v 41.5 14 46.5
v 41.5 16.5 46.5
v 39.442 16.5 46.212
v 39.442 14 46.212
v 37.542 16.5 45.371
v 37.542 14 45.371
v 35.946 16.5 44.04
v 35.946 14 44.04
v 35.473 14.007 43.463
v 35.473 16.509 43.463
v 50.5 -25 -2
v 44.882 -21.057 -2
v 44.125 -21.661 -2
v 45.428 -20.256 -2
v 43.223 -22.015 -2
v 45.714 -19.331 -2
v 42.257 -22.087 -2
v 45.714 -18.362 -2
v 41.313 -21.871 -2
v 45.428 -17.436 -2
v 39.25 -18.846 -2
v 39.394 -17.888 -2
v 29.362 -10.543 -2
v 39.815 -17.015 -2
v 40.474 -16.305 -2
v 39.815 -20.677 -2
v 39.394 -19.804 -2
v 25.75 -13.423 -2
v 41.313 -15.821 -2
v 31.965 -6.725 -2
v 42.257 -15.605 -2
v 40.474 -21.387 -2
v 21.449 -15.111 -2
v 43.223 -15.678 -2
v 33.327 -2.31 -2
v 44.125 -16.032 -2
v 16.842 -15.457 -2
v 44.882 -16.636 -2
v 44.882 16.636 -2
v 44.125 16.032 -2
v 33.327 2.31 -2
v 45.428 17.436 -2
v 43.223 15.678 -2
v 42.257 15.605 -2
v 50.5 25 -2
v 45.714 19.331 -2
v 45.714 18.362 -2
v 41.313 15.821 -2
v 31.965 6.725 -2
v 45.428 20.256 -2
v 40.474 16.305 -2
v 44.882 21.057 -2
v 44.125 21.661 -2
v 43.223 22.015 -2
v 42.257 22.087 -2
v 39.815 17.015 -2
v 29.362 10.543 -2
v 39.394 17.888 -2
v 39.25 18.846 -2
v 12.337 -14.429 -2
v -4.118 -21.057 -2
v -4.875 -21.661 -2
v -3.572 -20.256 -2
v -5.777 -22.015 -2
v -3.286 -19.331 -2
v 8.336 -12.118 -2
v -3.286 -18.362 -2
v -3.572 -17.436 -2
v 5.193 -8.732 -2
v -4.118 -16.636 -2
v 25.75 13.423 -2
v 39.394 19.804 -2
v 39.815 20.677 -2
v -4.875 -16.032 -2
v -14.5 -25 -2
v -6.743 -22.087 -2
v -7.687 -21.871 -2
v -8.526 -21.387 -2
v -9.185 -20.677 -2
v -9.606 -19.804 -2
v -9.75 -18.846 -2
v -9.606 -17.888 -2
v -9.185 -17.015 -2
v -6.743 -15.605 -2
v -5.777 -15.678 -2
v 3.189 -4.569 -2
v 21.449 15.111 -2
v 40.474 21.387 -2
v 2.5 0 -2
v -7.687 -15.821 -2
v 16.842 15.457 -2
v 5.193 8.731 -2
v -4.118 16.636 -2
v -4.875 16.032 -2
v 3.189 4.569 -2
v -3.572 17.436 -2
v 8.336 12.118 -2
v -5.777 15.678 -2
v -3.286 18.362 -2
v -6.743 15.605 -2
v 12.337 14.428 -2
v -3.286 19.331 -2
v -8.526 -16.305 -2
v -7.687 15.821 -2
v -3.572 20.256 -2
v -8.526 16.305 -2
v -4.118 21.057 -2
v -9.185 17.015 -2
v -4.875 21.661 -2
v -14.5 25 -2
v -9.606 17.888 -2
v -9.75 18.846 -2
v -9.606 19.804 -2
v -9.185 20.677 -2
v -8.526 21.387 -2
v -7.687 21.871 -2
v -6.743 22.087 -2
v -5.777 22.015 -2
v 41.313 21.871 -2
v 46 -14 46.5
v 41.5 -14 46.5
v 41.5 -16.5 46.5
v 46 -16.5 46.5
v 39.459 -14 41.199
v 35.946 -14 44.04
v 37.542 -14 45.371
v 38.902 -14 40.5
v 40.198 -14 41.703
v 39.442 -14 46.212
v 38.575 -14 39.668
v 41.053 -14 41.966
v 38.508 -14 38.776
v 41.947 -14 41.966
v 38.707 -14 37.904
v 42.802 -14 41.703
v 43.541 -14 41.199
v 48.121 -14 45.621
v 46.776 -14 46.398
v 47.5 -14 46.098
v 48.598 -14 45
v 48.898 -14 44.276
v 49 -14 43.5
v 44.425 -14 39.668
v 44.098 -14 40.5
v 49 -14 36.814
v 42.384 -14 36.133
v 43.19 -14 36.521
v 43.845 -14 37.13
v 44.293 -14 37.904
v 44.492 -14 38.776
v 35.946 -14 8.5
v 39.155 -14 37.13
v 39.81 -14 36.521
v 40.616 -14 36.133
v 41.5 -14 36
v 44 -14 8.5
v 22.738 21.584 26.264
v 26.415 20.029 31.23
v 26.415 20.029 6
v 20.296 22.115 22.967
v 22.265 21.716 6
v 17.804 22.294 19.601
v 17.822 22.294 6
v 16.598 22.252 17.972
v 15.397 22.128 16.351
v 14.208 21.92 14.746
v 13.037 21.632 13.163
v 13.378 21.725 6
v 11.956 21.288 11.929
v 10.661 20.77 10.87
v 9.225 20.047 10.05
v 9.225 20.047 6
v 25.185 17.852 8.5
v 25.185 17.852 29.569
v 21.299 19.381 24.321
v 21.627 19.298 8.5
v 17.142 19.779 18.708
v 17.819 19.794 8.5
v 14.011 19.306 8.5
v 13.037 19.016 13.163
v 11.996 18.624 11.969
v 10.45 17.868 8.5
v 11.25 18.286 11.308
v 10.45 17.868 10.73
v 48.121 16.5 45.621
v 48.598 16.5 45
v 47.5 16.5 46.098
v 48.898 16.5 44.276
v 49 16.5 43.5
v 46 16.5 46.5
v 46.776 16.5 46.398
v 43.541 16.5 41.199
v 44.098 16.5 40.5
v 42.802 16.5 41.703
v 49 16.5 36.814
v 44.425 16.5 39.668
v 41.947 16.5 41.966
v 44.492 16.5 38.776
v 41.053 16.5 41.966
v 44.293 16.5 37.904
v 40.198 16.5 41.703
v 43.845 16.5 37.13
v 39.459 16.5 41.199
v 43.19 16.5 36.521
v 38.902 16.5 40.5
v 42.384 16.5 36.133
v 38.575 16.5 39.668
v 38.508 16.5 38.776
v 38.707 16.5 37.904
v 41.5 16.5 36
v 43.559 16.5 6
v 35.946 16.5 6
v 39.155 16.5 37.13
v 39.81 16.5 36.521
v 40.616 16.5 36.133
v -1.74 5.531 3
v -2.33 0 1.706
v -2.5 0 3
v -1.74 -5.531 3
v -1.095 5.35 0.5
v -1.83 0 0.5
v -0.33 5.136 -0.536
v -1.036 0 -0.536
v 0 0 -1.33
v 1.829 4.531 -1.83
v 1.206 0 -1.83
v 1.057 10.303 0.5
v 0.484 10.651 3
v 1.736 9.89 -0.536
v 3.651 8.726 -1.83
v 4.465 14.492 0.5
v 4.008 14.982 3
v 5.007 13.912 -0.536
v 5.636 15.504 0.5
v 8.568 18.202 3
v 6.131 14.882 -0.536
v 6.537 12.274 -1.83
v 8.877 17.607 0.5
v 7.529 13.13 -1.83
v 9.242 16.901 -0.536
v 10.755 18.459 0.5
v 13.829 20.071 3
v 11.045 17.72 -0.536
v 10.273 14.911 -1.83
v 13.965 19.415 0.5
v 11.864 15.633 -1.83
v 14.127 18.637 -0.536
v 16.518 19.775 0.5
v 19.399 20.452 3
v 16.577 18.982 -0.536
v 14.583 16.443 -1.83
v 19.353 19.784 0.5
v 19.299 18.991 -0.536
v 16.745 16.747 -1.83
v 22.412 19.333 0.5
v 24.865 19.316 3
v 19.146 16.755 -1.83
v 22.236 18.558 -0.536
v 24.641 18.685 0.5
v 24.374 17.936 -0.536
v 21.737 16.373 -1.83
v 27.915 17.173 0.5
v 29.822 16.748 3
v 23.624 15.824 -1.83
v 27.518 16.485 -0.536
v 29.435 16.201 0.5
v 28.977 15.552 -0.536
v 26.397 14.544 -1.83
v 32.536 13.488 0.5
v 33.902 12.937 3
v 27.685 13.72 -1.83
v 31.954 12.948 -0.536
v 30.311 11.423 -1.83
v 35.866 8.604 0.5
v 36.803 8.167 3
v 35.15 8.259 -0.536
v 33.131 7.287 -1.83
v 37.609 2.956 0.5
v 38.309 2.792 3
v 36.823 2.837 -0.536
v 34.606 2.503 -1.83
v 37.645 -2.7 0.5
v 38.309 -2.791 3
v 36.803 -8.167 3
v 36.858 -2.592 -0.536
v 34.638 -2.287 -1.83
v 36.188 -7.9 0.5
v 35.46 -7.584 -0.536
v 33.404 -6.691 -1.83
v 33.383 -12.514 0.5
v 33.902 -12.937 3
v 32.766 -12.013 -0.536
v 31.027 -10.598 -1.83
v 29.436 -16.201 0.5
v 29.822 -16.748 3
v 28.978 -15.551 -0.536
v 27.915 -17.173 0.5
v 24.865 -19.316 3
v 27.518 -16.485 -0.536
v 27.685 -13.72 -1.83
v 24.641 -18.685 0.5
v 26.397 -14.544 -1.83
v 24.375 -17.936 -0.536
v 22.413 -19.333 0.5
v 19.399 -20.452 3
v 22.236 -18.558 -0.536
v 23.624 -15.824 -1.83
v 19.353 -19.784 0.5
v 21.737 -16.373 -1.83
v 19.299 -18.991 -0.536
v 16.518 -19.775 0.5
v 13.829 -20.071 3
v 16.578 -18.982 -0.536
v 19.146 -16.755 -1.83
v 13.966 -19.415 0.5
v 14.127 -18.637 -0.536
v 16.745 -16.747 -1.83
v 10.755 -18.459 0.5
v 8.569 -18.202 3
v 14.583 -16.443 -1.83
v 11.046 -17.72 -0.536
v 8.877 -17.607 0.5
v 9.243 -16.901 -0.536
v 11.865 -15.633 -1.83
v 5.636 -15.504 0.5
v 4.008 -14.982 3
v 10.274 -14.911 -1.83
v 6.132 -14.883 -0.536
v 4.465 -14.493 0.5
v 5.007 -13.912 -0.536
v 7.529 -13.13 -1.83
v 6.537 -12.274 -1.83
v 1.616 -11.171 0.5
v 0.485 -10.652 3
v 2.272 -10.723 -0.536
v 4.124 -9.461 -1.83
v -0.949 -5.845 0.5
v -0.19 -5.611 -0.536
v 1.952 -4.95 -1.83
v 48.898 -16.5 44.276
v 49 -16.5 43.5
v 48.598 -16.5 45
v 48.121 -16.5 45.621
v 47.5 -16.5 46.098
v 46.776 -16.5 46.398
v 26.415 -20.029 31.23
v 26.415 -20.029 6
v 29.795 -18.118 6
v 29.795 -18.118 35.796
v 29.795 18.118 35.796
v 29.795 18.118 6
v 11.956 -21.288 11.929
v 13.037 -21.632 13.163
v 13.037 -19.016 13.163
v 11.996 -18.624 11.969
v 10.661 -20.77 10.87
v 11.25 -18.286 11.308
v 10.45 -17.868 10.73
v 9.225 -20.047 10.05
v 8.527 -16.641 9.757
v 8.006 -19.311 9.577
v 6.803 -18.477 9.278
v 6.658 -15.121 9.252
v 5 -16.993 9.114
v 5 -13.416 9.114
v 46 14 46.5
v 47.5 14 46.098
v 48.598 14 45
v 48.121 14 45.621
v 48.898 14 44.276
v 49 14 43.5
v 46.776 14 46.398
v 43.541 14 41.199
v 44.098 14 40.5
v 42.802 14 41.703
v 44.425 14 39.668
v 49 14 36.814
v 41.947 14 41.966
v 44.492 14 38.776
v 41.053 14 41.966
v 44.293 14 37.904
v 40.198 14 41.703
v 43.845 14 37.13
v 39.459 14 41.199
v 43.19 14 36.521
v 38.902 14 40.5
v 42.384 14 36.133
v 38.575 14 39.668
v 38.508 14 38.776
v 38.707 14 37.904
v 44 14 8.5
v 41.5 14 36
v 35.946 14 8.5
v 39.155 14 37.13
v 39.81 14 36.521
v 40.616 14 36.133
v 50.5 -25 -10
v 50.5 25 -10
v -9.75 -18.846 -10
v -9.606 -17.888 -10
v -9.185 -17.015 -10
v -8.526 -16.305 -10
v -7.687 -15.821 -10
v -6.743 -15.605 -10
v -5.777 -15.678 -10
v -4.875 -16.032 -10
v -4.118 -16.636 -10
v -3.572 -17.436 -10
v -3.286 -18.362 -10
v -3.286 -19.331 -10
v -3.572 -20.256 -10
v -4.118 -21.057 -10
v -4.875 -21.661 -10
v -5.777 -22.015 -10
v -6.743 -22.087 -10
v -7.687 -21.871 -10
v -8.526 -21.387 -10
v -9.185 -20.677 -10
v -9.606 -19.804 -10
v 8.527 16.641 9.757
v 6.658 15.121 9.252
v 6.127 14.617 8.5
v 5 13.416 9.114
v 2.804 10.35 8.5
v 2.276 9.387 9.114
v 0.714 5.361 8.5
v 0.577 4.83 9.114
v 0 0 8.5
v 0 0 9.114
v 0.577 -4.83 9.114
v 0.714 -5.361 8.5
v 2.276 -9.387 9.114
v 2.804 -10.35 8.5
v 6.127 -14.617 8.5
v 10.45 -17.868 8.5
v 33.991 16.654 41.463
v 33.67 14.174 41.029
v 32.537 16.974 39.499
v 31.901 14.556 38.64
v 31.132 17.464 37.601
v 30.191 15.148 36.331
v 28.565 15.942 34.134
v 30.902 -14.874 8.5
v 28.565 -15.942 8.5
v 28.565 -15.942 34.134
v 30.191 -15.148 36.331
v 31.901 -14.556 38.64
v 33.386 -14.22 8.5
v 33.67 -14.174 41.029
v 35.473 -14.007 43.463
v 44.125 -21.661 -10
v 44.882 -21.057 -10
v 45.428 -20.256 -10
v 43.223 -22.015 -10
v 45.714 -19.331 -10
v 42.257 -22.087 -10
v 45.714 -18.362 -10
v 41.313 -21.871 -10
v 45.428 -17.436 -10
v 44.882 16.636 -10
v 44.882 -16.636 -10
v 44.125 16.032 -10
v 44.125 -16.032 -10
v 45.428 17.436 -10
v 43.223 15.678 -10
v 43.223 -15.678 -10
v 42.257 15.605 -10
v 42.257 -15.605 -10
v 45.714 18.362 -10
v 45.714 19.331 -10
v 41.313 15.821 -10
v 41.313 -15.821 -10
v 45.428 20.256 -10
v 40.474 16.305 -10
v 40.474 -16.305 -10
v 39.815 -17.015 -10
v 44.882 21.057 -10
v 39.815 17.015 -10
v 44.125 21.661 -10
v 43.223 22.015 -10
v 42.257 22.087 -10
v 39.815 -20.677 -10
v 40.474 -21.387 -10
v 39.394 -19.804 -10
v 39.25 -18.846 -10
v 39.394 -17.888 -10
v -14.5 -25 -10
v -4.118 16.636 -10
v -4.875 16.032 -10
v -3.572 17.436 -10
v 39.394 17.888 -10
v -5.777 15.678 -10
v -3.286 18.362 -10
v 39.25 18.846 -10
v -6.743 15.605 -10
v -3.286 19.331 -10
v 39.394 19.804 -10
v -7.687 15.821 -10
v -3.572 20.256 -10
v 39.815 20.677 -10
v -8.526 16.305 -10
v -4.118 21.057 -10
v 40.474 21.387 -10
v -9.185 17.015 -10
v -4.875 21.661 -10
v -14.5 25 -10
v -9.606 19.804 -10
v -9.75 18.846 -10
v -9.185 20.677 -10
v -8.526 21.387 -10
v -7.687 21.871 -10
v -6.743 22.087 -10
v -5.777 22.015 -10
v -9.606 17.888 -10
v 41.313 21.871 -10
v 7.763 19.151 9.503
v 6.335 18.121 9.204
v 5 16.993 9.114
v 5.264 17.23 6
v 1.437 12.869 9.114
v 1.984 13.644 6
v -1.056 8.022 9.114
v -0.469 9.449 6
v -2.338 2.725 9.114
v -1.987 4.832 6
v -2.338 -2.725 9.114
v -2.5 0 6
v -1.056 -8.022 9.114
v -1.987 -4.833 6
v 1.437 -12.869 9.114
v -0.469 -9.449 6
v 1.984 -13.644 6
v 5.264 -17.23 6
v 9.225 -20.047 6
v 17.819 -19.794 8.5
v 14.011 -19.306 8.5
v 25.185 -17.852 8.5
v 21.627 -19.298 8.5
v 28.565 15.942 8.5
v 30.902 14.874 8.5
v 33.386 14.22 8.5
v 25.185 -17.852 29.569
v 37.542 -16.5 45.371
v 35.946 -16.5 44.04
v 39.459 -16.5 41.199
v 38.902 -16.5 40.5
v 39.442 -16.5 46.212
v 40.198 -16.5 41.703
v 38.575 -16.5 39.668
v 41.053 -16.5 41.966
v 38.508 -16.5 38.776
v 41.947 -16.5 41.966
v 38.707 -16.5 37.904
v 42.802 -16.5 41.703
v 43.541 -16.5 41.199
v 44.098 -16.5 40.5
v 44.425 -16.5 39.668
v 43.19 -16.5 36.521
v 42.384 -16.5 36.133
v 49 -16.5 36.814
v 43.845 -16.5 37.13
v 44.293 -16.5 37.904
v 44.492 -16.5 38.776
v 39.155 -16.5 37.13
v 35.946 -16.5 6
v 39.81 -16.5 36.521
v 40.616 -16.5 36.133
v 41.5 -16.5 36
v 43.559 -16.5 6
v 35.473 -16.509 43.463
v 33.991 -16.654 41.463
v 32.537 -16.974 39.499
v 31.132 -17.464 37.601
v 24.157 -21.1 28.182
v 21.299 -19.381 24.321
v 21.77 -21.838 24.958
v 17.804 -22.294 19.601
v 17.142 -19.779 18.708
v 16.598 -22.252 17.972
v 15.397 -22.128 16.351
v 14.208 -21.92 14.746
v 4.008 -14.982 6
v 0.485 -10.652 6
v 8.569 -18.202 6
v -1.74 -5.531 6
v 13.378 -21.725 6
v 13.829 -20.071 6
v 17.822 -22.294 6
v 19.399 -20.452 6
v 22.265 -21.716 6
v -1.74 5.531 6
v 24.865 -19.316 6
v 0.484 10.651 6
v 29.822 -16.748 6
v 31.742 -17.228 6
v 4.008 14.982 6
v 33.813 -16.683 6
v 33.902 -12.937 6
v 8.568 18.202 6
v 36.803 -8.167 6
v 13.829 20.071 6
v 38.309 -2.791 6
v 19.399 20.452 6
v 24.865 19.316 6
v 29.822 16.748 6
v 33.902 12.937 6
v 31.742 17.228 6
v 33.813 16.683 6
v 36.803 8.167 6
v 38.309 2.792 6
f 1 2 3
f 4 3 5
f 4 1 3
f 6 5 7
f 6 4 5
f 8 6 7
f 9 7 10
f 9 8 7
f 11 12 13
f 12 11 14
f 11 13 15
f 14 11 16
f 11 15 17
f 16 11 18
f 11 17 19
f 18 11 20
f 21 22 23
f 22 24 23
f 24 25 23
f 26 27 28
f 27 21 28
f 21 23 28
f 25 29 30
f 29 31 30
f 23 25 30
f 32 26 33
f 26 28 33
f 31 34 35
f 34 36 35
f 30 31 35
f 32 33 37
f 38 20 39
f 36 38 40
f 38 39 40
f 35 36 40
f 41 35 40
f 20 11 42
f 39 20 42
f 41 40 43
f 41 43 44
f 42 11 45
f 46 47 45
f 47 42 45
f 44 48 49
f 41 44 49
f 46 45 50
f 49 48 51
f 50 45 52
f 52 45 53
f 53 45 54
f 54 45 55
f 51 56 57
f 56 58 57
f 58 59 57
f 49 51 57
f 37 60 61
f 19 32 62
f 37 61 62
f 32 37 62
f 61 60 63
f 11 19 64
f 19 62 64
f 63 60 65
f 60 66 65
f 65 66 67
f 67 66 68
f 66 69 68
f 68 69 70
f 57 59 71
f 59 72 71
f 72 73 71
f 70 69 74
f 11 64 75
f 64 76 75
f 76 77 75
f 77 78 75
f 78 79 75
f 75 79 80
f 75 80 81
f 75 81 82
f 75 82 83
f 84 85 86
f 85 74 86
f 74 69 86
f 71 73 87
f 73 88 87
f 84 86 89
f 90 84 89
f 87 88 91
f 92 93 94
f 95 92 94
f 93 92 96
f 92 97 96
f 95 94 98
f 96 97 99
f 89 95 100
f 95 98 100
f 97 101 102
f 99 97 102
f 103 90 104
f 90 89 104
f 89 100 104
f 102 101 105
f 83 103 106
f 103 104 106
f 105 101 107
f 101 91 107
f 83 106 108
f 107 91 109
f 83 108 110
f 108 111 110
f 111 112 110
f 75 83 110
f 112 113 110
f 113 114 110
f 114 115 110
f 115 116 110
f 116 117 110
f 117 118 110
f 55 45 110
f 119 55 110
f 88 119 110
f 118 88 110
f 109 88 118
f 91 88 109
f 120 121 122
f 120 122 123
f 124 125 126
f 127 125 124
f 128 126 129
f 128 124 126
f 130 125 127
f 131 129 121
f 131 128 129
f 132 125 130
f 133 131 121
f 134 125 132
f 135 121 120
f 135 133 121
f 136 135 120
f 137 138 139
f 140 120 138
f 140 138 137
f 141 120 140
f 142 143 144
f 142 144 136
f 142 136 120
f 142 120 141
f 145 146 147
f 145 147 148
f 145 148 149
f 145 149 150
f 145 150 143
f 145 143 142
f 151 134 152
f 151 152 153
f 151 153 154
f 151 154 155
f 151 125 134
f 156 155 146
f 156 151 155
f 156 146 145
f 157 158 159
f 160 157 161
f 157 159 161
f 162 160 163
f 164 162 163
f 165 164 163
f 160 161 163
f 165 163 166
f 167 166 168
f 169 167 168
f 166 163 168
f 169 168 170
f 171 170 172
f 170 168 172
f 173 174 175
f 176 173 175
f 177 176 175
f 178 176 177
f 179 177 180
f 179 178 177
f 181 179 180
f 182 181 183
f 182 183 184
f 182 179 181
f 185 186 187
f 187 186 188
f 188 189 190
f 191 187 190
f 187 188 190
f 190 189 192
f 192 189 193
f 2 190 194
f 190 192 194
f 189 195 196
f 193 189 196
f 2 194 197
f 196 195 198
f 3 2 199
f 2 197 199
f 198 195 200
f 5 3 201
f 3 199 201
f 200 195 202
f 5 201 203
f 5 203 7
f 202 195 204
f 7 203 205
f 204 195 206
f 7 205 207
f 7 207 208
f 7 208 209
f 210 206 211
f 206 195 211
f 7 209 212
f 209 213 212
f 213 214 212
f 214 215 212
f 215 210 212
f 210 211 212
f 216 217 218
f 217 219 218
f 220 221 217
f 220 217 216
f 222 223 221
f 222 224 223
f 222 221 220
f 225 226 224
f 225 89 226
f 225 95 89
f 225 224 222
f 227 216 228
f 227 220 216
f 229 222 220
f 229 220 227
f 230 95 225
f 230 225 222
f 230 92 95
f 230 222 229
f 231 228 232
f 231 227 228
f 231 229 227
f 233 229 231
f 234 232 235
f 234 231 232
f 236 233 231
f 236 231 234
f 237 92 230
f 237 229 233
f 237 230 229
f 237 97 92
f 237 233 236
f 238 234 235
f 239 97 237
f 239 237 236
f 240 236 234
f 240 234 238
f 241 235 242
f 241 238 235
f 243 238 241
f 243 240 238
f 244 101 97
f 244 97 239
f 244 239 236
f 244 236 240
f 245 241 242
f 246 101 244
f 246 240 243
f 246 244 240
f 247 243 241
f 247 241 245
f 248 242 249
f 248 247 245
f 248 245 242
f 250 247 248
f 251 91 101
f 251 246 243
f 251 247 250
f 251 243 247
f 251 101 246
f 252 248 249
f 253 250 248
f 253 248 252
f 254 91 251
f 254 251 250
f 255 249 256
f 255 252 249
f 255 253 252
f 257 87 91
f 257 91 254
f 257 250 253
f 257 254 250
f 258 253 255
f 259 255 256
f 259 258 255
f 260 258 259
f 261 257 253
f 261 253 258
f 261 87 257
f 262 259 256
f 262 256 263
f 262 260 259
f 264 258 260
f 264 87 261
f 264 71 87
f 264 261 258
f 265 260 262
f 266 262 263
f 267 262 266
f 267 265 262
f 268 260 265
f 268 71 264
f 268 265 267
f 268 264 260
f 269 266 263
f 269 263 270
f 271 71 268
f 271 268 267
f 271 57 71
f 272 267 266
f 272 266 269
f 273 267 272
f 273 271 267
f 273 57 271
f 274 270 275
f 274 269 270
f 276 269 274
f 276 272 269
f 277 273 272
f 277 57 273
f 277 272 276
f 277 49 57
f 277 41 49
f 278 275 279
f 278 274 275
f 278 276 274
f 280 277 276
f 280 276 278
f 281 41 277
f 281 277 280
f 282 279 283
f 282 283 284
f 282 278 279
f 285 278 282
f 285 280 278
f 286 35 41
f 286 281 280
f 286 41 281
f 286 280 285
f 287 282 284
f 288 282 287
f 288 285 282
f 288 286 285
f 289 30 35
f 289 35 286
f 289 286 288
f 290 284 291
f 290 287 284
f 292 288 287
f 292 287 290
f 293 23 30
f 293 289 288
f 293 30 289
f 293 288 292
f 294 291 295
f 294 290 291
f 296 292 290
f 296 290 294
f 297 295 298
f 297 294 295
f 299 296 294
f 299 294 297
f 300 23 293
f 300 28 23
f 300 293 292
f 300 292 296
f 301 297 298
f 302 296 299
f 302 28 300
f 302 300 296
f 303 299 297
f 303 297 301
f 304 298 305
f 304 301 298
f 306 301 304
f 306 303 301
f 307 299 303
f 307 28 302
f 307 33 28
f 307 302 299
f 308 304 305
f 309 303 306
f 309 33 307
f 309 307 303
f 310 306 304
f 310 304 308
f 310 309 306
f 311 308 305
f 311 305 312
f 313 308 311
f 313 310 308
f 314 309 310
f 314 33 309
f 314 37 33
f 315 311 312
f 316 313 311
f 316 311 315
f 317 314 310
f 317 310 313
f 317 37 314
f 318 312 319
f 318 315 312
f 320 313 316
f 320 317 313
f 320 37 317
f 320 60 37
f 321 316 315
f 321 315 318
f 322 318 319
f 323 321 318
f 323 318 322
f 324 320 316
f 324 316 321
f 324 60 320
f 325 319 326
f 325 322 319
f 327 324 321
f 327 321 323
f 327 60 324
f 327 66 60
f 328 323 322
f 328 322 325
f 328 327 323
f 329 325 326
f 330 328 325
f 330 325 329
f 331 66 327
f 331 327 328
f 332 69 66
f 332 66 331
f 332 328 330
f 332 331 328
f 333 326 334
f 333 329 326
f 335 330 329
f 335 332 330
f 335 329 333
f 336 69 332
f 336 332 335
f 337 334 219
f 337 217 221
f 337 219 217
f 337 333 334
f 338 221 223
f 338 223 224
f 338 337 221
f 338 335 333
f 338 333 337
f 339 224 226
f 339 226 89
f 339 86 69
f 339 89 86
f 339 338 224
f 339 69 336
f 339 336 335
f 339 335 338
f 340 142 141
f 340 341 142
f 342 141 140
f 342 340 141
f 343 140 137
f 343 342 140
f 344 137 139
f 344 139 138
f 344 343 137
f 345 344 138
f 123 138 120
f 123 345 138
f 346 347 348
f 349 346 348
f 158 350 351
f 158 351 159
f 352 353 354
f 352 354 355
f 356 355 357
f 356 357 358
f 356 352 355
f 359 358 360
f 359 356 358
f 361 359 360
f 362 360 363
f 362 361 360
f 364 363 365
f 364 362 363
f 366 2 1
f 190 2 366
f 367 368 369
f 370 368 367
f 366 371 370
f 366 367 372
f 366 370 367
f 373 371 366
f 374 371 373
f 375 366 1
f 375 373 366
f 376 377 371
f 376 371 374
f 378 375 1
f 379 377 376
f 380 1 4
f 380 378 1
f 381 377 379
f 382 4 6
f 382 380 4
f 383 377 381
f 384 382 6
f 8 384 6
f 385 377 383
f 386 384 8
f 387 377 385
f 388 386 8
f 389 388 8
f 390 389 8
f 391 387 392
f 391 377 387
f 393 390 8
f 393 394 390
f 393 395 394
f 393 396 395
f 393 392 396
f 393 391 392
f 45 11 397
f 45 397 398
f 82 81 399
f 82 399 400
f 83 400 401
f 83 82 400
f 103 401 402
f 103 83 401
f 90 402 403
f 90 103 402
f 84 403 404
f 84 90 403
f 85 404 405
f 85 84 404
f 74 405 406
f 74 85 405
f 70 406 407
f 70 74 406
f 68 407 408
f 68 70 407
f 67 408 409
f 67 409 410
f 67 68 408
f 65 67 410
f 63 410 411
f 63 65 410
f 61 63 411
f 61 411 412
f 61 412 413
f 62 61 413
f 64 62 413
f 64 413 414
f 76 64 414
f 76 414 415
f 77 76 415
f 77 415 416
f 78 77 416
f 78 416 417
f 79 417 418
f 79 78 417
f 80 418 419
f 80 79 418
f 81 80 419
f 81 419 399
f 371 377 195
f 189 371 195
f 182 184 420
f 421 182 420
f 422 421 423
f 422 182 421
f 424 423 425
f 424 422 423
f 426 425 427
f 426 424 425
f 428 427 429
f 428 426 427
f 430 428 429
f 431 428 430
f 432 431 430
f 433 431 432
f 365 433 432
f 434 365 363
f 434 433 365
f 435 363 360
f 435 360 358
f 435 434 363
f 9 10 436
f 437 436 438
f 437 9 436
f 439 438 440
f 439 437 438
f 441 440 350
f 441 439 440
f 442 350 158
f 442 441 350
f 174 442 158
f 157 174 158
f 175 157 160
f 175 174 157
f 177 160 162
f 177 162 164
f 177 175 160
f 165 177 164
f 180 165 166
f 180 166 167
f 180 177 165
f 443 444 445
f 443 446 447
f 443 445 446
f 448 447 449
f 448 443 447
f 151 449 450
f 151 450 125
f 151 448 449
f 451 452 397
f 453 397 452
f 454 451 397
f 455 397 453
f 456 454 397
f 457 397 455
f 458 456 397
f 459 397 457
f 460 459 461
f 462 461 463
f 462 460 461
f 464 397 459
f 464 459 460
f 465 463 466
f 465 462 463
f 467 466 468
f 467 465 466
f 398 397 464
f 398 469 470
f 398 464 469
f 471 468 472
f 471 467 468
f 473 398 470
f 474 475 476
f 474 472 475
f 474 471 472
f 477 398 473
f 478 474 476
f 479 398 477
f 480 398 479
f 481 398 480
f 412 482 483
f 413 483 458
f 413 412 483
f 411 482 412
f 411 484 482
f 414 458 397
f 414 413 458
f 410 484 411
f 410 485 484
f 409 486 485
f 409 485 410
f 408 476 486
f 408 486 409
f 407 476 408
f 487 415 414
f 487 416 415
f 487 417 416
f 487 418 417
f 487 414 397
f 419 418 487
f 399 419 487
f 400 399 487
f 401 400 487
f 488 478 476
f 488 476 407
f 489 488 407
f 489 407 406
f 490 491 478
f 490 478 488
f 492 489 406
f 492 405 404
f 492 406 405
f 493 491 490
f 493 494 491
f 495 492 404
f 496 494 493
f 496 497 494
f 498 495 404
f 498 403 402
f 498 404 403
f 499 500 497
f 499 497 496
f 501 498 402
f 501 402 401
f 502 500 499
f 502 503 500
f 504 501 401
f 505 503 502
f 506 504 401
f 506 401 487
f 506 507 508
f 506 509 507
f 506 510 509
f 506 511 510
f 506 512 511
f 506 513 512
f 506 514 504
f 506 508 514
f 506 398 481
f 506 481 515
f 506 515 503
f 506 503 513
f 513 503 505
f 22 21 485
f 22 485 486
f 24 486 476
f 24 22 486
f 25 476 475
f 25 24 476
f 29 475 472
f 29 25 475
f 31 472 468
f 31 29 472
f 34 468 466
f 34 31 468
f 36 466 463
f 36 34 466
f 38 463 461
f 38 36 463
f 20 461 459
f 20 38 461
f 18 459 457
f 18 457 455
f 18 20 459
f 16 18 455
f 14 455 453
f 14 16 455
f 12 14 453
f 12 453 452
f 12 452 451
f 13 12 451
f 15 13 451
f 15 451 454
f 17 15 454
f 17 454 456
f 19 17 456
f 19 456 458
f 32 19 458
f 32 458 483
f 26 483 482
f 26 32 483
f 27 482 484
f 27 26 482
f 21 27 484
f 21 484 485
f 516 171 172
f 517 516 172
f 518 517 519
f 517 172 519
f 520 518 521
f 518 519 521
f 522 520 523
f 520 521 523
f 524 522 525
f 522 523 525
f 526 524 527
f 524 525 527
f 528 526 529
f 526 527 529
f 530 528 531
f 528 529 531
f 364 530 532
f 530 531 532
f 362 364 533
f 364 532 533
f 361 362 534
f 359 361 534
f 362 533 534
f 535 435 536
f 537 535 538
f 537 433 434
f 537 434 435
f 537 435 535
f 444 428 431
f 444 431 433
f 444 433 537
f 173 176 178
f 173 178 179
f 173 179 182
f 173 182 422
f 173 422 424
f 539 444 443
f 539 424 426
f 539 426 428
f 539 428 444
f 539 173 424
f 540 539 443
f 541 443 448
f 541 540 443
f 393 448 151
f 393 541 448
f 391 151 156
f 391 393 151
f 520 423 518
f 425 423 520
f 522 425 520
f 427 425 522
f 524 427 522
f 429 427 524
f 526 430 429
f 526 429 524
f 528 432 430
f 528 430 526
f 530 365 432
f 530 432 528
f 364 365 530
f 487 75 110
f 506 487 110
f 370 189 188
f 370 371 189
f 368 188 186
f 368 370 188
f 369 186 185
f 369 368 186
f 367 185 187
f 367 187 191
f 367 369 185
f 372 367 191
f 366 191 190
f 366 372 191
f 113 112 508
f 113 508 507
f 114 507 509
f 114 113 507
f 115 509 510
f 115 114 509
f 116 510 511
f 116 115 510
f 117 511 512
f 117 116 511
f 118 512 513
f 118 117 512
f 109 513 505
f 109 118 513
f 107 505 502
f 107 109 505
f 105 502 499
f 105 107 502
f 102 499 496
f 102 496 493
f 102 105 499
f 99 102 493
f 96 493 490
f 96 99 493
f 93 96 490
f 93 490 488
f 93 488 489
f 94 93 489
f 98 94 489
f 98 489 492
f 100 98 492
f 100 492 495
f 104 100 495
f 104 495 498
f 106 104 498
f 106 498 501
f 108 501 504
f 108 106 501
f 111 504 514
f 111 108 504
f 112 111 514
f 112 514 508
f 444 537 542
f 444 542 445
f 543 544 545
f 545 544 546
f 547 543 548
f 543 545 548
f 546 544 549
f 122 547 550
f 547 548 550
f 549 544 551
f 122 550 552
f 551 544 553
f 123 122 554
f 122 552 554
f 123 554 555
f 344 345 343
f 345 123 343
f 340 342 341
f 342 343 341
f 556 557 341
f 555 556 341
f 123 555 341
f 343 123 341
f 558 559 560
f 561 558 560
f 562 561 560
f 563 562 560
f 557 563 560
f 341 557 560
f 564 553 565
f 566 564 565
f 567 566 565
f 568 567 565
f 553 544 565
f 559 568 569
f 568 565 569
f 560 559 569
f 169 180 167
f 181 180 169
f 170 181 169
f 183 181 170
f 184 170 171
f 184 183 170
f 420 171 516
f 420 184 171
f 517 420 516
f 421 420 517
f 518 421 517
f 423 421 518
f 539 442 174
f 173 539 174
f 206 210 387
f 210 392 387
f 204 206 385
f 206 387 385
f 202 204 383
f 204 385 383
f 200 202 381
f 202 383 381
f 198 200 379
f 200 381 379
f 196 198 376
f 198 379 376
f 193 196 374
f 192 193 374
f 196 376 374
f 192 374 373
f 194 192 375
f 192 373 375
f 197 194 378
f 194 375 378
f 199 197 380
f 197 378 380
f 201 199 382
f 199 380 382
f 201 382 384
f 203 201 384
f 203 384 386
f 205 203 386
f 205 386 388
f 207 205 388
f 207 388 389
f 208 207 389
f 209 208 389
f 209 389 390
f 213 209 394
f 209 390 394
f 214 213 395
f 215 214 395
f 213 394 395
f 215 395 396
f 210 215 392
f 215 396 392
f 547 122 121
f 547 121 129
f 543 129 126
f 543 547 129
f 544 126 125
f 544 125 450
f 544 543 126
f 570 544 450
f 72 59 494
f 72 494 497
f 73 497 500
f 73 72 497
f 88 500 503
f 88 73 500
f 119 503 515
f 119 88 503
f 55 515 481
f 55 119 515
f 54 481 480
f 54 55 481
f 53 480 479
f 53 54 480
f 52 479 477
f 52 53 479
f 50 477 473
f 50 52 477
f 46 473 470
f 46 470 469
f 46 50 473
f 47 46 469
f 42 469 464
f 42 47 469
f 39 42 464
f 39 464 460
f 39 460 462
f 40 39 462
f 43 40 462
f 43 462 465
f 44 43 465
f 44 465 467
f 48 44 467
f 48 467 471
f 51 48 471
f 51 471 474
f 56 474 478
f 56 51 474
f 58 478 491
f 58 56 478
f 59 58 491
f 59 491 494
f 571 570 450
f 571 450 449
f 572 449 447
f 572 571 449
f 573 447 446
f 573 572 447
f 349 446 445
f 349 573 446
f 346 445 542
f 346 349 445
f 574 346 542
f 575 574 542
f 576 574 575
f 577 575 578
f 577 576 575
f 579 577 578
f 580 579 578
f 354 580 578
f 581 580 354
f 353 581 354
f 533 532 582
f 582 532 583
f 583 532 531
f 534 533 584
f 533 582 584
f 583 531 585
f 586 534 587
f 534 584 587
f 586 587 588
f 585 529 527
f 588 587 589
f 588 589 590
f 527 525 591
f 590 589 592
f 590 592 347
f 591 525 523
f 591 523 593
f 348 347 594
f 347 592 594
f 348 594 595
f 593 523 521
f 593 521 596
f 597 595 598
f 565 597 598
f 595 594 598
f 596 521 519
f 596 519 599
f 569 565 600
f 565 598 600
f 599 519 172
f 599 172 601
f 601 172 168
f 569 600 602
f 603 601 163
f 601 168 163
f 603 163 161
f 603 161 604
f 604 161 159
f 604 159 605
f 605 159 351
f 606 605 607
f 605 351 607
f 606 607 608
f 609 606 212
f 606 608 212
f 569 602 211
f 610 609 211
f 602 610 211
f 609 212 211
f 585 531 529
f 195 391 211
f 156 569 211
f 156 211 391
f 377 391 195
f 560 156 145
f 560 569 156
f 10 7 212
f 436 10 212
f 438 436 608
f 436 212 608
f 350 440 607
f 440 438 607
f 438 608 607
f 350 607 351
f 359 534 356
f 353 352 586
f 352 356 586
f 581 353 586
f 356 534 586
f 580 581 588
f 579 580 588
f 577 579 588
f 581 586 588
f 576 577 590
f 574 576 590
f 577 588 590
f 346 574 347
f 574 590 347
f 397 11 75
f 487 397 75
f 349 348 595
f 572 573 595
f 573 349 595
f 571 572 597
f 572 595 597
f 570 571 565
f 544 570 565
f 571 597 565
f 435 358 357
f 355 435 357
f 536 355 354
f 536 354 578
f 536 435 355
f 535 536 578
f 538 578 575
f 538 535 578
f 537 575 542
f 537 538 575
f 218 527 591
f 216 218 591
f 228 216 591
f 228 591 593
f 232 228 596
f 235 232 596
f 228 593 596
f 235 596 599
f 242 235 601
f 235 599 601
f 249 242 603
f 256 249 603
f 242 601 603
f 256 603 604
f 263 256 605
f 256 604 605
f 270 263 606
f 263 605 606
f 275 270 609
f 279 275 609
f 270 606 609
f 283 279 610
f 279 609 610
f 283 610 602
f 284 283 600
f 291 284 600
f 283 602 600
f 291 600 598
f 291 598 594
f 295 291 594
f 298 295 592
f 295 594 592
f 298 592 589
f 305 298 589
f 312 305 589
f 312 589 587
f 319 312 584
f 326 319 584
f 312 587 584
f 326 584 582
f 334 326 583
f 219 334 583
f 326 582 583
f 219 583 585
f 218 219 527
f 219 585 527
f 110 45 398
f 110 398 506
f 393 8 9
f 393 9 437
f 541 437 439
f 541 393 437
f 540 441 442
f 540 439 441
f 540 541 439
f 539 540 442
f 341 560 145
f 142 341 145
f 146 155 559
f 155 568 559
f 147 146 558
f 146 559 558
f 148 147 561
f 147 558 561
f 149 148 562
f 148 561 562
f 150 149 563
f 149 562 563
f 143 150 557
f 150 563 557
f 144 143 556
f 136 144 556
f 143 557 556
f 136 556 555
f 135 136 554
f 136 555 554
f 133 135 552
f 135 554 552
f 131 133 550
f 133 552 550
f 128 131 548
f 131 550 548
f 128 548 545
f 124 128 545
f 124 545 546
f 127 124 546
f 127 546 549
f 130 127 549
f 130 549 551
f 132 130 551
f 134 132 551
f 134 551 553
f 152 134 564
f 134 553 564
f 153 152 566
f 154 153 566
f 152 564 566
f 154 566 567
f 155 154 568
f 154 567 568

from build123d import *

# Parameters (mm, degrees)
EXTRUDE_1_DEPTH     = 46.5
SKETCH_4_OUTSIDE_W  = 66.66
SKETCH_4_OUTSIDE_H  = 64.16
CUT_EXTRUDE_1_DEPTH = 50
SHELL_START         = 6
SHELL_1_DEPTH       = 40.5
SHELL_START_2       = 8.5
SHELL_1_2_DEPTH     = 38
SHELL_START_3       = -22.293752824
SHELL_1_3_DEPTH     = 44.587505647
SKETCH_5_R          = 20.5
EXTRUDE_3_DEPTH     = 8
FILLET_1_R          = 5
SKETCH_4_8_R        = 3
CUT_EXTRUDE_3_DEPTH = 48
FILLET_3_R          = 3
SKETCH_8_W          = 65
SKETCH_8_H          = 50
SKETCH_8_R          = 3.25
EXTRUDE_4_DEPTH     = 8


with BuildPart() as part:
    # 草图1 → 凸台-拉伸1 (new body)
    with BuildSketch(Plane.XY):
        with BuildLine():
            ThreePointArc((35.945795724, -14), (32.1298187, -14.493507683), (28.564936874, -15.941557419))
            Line((28.564936874, -15.941557419), (25.184577361, -17.852195404))
            ThreePointArc((25.184577361, -17.852195404), (17.819425425, -19.7937446), (10.450223542, -17.867624161))
            ThreePointArc((10.450223542, -17.867624161), (0, 0), (10.450223542, 17.867624161))
            ThreePointArc((10.450223542, 17.867624161), (17.819425425, 19.7937446), (25.184577361, 17.852195404))
            Line((25.184577361, 17.852195404), (28.564936874, 15.941557419))
            ThreePointArc((28.564936874, 15.941557419), (32.1298187, 14.493507683), (35.945795724, 14))
            Line((35.945795724, 14), (49, 14))
            Line((49, 14), (49, -14))
            Line((49, -14), (35.945795724, -14))
        make_face()
    extrude(amount=EXTRUDE_1_DEPTH)

    # 草图4 outside → 切除-拉伸1 (cut, symmetric)
    with BuildSketch(Plane.XZ.offset(14)):
        with Locations((24.5, 23.25)):
            Rectangle(SKETCH_4_OUTSIDE_W, SKETCH_4_OUTSIDE_H)
        with BuildLine():
            Line((49, 36.813688531), (44, 8.5))
            Line((44, 8.5), (0, 8.5))
            Line((0, 8.5), (0, 9.114014501))
            Line((0, 9.114014501), (5, 9.114014501))
            ThreePointArc((5, 9.114014501), (9.499546785, 10.183500589), (13.036653031, 13.163198754))
            Line((13.036653031, 13.163198754), (35.472510226, 43.46311181))
            ThreePointArc((35.472510226, 43.46311181), (38.125339912, 45.697885434), (41.5, 46.5))
            Line((41.5, 46.5), (49, 46.5))
            Line((49, 46.5), (49, 36.813688531))
        make_face(mode=Mode.SUBTRACT)
    extrude(amount=CUT_EXTRUDE_1_DEPTH, both=True, mode=Mode.SUBTRACT)

    # 抽壳1: read off the stored shape, not the designer's step
    # 抽壳1 outline → 抽壳1 (add)
    with BuildSketch(Plane.XY.offset(SHELL_START)):
        with BuildLine():
            Line((49, -16.5), (49, 16.5))
            Line((49, 16.5), (35.945796372, 16.5))
            ThreePointArc((35.945796372, 16.5), (32.765815184, 16.91125632), (29.795080015, 18.117964516))
            Line((29.795080015, 18.117964516), (26.414720503, 20.028602501))
            ThreePointArc((26.414720503, 20.028602501), (17.822043244, 22.293743229), (9.224641048, 20.046602717))
            ThreePointArc((9.224641048, 20.046602717), (-2.5, 3.232e-06), (9.224641048, -20.046602717))
            ThreePointArc((9.224641048, -20.046602717), (17.822043244, -22.293743229), (26.414720503, -20.028602501))
            Line((26.414720503, -20.028602501), (29.795080015, -18.117964516))
            ThreePointArc((29.795080015, -18.117964516), (32.765815184, -16.91125632), (35.945796372, -16.5))
            Line((35.945796372, -16.5), (49, -16.5))
        make_face()
    extrude(amount=SHELL_1_DEPTH)

    # Shell 1 2 outline → Shell 1 2 (cut)
    with BuildSketch(Plane.XY.offset(SHELL_START_2)):
        with BuildLine():
            Line((25.184577361, -17.852195404), (28.564936874, -15.941557419))
            ThreePointArc((28.564936874, -15.941557419), (32.129818701, -14.493507683), (35.945795724, -14))
            Line((35.945795724, -14), (49, -14))
            Line((49, -14), (49, 14))
            Line((49, 14), (35.945795724, 14))
            ThreePointArc((35.945795724, 14), (32.129818701, 14.493507683), (28.564936874, 15.941557419))
            Line((28.564936874, 15.941557419), (25.184577361, 17.852195404))
            ThreePointArc((25.184577361, 17.852195404), (17.819425424, 19.7937446), (10.450223542, 17.867624161))
            ThreePointArc((10.450223542, 17.867624161), (0, 0), (10.450223542, -17.867624161))
            ThreePointArc((10.450223542, -17.867624161), (17.819425424, -19.7937446), (25.184577361, -17.852195404))
        make_face()
    extrude(amount=SHELL_1_2_DEPTH, mode=Mode.SUBTRACT)

    # Shell 1 3 outline → Shell 1 3 (cut)
    with BuildSketch(Plane(origin=(0, 0, 0), x_dir=(1, 0, 0), z_dir=(0, 1, 0)).offset(SHELL_START_3)):
        with BuildLine():
            Line((-4, -46.5), (41.5, -46.5))
            ThreePointArc((41.5, -46.5), (38.125339907, -45.697885432), (35.47251022, -43.463111802))
            Line((35.47251022, -43.463111802), (13.036653031, -13.163198754))
            ThreePointArc((13.036653031, -13.163198754), (9.499546673, -10.183500533), (4.999999751, -9.114014501))
            Line((4.999999751, -9.114014501), (-4, -9.114014501))
            Line((-4, -9.114014501), (-4, -46.5))
        make_face()
        Polygon((49, -36.813688531), (49, -6), (43.558517429, -6), align=None)
    extrude(amount=SHELL_1_3_DEPTH, mode=Mode.SUBTRACT)

    # 草图5 → 凸台-拉伸3 (add)
    with BuildSketch(Plane(origin=(0, 0, 6), x_dir=(-1, 0, 0), z_dir=(0, 0, -1))):
        with Locations(Location((-18, 0, 0), (0, 0, 359.999469823))):
            Circle(SKETCH_5_R)
    extrude(amount=EXTRUDE_3_DEPTH)

    # 圆角1
    fillet_1_edges = [part.edges().sort_by_distance(p)[0] for p in [
        (38.499999999, 0.000189693, -2),
    ]]
    fillet(fillet_1_edges, radius=FILLET_1_R)

    # 草图4<8> → 切除-拉伸3 (cut, symmetric)
    with BuildSketch(Plane.XZ.offset(14)):
        with Locations(Location((41.5, 39, 0), (0, 0, 270))):
            Circle(SKETCH_4_8_R)
    extrude(amount=CUT_EXTRUDE_3_DEPTH, both=True, mode=Mode.SUBTRACT)

    # 圆角3
    fillet_3_edges = [part.edges().sort_by_distance(p)[0] for p in [
        (49, -15.25, 46.5),
        (49, 15.25, 46.5),
    ]]
    fillet(fillet_3_edges, radius=FILLET_3_R)

    # 草图8 → 凸台-拉伸4 (add)
    with BuildSketch(Plane(origin=(0, 0, -2), x_dir=(-1, 0, 0), z_dir=(0, 0, -1))):
        with Locations((-18, 0)):
            Rectangle(SKETCH_8_W, SKETCH_8_H)
        with Locations((6.5, 18.846153846)):
            Circle(SKETCH_8_R, mode=Mode.SUBTRACT)
        with Locations((6.5, -18.846153846)):
            Circle(SKETCH_8_R, mode=Mode.SUBTRACT)
        with Locations((-42.5, -18.846153846)):
            Circle(SKETCH_8_R, mode=Mode.SUBTRACT)
        with Locations((-42.5, 18.846153846)):
            Circle(SKETCH_8_R, mode=Mode.SUBTRACT)
    extrude(amount=EXTRUDE_4_DEPTH)


solid = part.part
